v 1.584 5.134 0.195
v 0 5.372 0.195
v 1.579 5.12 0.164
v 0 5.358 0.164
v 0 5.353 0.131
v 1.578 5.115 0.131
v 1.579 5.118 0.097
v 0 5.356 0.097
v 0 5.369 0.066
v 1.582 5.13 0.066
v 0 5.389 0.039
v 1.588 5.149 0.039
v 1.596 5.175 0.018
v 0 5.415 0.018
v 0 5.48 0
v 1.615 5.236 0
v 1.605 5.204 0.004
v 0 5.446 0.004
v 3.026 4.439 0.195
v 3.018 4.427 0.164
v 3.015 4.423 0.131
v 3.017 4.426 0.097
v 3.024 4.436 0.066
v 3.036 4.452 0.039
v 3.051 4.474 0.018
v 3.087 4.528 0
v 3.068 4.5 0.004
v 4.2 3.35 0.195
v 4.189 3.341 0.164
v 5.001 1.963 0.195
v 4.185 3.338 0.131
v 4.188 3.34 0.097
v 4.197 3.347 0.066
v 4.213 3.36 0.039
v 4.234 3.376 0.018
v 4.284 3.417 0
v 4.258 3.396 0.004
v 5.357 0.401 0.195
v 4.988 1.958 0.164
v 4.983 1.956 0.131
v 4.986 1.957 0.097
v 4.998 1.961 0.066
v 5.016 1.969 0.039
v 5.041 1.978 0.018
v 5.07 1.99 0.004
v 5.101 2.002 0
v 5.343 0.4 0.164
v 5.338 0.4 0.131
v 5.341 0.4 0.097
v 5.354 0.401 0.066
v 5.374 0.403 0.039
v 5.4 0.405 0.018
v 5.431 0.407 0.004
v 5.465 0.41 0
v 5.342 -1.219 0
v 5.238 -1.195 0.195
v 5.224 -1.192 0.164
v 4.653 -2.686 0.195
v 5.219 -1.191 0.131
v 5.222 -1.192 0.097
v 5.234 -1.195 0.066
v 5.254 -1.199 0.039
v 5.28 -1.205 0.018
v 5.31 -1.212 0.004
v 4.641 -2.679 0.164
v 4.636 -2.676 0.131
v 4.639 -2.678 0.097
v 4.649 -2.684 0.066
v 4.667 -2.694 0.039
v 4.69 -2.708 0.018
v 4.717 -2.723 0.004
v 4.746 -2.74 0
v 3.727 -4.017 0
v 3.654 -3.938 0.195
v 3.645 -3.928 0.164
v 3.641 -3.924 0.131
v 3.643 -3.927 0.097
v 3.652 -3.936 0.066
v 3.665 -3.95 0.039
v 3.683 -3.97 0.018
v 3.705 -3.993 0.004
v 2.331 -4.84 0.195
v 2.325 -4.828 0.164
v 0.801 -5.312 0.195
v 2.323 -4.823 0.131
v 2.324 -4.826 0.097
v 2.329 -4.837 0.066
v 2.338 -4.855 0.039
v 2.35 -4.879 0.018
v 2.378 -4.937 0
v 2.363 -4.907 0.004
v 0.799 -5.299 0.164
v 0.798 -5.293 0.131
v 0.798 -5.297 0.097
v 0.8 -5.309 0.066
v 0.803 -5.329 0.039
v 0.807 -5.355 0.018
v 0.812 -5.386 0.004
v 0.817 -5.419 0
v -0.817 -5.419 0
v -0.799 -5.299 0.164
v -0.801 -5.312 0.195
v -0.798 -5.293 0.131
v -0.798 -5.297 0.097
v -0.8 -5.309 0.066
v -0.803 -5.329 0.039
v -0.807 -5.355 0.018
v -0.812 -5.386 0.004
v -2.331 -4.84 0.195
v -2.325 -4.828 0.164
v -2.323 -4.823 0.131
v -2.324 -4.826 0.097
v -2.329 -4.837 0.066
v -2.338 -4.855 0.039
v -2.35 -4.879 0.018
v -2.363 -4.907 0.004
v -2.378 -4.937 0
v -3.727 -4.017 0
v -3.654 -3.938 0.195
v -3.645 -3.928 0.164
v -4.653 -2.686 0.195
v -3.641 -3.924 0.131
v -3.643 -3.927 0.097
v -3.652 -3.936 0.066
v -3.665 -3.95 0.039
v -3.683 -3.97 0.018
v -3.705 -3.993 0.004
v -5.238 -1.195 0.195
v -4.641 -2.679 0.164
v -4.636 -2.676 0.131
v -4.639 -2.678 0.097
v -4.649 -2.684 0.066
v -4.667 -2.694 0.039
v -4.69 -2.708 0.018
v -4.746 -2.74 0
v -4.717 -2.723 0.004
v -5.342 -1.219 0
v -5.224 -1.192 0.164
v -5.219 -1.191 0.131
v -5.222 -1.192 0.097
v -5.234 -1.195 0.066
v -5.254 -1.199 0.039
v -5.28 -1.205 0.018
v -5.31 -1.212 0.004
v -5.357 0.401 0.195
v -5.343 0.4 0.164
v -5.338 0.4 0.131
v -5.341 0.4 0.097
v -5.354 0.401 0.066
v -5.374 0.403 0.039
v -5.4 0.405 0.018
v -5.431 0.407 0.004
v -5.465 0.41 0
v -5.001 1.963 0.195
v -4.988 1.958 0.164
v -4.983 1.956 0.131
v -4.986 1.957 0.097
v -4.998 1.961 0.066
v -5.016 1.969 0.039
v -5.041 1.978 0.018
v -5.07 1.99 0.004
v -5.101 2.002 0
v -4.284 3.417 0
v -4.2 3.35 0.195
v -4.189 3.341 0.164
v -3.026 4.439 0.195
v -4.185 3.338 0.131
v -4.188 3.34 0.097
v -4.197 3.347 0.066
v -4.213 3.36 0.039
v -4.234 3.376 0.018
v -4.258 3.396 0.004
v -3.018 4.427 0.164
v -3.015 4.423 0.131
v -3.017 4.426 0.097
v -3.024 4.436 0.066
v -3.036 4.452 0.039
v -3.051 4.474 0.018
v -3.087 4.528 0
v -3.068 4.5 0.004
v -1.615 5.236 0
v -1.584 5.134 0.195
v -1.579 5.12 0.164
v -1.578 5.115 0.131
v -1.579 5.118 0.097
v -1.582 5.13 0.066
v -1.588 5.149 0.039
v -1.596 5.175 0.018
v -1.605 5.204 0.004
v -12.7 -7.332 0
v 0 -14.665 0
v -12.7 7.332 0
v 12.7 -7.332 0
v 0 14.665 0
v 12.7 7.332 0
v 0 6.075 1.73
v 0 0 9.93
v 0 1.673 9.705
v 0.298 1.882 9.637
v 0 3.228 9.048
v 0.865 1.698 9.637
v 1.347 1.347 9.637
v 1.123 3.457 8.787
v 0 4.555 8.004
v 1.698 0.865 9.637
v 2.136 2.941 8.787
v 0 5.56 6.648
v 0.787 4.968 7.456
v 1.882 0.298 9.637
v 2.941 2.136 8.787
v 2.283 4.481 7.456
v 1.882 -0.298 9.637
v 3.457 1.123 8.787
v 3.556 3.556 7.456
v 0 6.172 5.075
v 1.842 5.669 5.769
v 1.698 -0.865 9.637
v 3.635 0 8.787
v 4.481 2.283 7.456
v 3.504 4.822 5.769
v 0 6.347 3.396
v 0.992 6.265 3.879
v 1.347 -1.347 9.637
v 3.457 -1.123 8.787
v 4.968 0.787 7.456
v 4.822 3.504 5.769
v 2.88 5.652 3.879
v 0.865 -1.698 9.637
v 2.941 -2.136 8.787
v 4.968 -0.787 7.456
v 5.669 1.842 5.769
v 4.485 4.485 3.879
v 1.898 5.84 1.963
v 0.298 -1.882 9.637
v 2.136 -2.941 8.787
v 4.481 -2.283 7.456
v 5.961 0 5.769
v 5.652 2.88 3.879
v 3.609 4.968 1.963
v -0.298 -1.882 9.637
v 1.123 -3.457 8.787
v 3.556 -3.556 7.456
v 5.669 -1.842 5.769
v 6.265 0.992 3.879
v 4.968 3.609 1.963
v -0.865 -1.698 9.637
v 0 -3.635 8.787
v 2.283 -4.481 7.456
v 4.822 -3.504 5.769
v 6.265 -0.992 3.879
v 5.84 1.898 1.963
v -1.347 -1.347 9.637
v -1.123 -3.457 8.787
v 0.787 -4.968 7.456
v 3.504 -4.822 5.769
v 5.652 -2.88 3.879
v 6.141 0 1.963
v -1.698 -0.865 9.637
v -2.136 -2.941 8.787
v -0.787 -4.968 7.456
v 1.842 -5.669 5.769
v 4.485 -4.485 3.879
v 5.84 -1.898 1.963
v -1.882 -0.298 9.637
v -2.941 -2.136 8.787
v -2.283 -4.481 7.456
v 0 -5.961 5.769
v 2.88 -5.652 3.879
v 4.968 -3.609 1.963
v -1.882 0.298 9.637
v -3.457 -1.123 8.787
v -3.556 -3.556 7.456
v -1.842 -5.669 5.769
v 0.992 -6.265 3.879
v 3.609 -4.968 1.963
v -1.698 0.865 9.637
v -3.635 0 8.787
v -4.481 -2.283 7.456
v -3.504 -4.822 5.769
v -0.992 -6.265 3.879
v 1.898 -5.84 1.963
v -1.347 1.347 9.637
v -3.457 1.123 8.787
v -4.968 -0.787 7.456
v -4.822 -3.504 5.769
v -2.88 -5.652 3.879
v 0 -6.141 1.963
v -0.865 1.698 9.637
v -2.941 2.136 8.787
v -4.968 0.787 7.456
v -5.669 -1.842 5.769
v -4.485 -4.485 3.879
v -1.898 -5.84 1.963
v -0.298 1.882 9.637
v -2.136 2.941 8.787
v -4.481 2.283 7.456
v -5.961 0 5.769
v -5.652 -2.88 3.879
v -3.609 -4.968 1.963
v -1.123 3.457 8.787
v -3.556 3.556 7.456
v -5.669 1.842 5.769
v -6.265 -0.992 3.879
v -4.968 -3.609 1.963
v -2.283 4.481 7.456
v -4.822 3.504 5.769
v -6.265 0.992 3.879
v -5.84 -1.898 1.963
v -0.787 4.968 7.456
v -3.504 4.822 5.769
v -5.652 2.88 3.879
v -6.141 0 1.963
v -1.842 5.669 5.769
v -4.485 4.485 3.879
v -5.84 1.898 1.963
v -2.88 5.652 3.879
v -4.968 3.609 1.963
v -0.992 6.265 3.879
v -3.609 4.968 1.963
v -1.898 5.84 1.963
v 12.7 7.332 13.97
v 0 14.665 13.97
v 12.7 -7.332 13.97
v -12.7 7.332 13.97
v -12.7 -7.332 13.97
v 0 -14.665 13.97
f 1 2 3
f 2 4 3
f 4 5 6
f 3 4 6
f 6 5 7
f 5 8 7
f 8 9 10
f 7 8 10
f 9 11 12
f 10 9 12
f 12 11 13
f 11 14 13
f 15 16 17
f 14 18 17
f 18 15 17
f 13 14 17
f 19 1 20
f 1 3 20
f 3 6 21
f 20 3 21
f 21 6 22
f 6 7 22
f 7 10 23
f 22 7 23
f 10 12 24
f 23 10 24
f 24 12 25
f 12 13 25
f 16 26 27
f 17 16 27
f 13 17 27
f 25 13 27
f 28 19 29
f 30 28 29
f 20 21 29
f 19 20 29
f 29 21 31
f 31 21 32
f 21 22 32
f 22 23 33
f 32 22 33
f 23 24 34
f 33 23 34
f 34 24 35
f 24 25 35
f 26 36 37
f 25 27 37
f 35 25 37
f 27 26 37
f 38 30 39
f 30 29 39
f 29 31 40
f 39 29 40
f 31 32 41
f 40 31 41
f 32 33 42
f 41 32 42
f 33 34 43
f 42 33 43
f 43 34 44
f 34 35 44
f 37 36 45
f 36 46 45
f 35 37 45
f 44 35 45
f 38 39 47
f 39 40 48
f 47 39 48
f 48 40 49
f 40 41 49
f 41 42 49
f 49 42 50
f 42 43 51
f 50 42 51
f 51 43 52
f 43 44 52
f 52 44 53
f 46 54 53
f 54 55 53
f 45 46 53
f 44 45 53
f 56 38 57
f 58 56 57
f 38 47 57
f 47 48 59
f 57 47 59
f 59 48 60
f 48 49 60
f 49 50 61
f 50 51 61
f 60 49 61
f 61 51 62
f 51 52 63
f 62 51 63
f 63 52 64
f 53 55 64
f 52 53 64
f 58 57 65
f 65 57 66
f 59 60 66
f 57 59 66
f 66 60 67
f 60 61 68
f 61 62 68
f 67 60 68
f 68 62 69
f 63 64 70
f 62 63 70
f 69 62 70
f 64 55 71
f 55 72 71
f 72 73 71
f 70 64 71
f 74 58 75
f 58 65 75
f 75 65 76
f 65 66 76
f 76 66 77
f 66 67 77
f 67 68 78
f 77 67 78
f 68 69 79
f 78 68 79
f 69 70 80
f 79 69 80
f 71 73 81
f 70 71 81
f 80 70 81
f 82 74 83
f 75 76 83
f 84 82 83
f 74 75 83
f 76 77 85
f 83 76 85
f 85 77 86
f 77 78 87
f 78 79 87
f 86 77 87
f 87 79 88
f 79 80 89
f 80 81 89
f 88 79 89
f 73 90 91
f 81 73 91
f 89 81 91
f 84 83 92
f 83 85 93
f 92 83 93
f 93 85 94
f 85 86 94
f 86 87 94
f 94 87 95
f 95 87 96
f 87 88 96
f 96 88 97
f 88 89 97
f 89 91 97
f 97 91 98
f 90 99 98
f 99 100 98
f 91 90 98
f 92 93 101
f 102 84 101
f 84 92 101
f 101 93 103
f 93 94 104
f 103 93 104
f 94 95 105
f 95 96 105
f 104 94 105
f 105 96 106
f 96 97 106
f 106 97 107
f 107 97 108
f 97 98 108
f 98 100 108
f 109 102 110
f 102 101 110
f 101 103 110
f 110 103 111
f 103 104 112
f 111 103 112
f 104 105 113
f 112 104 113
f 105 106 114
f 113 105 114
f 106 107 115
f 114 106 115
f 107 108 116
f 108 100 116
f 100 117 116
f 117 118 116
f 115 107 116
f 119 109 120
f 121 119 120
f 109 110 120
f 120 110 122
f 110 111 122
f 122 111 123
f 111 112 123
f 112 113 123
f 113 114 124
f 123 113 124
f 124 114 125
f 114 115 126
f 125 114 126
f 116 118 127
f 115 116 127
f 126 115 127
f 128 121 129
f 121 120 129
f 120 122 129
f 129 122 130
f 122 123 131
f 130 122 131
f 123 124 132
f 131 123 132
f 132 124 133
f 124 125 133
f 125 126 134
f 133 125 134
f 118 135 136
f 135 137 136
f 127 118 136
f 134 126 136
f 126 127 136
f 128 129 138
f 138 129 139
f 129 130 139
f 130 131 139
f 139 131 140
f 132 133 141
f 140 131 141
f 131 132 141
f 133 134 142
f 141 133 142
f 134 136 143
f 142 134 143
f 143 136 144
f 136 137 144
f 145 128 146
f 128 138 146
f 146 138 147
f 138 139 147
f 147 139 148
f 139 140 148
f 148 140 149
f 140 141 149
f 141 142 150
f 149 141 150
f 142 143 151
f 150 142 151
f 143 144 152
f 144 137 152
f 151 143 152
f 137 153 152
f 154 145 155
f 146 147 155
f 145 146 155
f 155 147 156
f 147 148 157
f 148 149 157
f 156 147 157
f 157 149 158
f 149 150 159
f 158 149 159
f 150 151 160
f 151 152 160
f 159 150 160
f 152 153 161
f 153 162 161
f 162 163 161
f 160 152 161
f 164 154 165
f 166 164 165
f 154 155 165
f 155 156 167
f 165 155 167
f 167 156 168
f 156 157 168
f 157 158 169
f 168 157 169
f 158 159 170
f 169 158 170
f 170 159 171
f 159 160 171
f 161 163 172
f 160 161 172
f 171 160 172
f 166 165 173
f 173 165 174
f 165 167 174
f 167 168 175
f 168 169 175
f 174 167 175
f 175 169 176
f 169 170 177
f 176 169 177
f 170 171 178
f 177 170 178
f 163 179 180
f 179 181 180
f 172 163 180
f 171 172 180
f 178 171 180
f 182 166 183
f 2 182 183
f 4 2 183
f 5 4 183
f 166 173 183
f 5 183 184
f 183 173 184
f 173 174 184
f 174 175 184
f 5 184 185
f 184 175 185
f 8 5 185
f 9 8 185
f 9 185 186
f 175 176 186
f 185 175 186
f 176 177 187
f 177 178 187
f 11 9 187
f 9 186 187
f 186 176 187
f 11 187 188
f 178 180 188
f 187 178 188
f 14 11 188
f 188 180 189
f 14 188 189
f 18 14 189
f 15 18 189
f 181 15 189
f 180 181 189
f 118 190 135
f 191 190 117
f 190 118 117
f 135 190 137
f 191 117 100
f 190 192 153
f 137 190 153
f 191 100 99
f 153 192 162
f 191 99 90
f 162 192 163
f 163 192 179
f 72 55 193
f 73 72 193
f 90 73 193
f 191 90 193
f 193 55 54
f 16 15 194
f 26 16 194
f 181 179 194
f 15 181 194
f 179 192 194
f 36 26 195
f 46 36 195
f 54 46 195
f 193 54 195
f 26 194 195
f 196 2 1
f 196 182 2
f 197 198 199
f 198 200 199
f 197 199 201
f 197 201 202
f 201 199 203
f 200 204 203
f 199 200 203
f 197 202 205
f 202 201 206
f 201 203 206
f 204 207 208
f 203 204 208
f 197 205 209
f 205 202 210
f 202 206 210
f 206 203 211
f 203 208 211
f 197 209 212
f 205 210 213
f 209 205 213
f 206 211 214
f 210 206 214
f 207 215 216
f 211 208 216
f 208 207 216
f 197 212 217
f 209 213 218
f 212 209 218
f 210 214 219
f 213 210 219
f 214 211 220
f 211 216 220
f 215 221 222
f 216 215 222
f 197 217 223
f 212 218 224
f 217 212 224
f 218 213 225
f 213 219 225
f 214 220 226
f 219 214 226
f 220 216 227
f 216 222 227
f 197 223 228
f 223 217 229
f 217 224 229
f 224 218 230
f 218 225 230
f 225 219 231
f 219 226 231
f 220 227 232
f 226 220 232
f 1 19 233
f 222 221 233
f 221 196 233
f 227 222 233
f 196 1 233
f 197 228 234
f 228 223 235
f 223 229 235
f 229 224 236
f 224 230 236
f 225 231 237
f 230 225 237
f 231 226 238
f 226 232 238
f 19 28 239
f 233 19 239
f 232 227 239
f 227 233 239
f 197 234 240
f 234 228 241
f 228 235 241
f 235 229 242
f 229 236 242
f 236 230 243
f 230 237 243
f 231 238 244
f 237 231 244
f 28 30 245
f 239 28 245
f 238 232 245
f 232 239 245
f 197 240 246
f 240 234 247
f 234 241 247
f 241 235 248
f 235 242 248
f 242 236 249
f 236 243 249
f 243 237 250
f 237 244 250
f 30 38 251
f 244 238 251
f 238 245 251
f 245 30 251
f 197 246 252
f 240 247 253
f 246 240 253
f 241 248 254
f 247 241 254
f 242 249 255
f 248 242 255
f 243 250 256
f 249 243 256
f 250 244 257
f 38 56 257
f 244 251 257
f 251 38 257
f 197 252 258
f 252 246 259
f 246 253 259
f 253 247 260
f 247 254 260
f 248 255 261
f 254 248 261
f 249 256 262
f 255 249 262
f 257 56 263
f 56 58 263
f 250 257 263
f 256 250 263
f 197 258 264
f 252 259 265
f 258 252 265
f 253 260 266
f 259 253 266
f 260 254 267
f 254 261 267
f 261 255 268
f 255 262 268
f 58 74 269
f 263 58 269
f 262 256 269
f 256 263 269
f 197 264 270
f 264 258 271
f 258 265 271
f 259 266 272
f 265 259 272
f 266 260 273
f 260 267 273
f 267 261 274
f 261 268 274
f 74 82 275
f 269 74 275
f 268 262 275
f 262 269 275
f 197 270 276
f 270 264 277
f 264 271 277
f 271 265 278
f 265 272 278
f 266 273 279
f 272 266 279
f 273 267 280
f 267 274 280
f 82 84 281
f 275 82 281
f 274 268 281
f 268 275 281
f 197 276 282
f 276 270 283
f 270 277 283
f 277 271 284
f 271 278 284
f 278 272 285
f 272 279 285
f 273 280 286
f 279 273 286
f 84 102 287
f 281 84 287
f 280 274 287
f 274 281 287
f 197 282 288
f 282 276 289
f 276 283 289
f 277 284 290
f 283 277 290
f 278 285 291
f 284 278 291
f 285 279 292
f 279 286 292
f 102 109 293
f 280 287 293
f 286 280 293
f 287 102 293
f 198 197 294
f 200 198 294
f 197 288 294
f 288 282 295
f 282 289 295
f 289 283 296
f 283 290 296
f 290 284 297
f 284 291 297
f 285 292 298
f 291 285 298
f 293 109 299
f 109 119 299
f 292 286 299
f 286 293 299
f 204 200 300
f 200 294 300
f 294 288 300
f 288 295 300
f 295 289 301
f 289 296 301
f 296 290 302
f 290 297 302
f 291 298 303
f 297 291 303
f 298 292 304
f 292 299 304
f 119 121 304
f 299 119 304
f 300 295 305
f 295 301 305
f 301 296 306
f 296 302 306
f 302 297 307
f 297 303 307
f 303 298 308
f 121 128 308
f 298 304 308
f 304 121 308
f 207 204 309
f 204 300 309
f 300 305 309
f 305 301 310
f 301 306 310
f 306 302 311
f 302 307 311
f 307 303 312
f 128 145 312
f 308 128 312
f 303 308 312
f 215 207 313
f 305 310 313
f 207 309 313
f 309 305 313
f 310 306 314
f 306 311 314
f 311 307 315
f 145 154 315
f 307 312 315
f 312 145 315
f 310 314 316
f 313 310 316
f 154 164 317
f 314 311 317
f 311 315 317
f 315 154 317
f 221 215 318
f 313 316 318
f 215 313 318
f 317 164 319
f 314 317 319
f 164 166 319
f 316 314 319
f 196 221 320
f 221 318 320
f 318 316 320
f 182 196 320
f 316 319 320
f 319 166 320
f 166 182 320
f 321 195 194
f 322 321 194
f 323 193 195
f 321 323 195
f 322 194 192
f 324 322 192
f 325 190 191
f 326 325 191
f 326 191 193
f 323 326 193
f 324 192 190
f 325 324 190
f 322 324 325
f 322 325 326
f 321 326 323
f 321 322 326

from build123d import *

# Parameters (mm, degrees)
BOSS_EXTRUDE1_DEPTH = 13.97


with BuildPart() as part:
    # Sketch1 → Boss-Extrude1 (new body)
    with BuildSketch(Plane.XY):
        Polygon((0, 14.664696837), (-12.7, 7.332348419), (-12.7, -7.332348419), (0, -14.664696837), (12.7, -7.332348419), (12.7, 7.332348419), align=None)
    extrude(amount=BOSS_EXTRUDE1_DEPTH)

    # Sketch4 → Cut-Revolve1 (revolve, cut)
    with BuildSketch(Plane(origin=(0, 0, 0), x_dir=(0, 0, -1), z_dir=(1, 0, 0))):
        with BuildLine():
            Line((0, 5.479886784), (0, 10.067284703))
            Line((0, 10.067284703), (2.770121515, 10.067284703))
            Line((2.770121515, 10.067284703), (2.770121515, 0))
            Line((2.770121515, 0), (-9.929878485, 0))
            ThreePointArc((-9.929878485, 0), (-6.647991818, 5.559602556), (-0.1947035, 5.372438024))
            ThreePointArc((-0.1947035, 5.372438024), (-0.065637733, 5.368694733), (0, 5.479886784))
        make_face()
    revolve(axis=Axis((0, 0, 9.929878485), (0, 0, -1)), mode=Mode.SUBTRACT)


solid = part.part
